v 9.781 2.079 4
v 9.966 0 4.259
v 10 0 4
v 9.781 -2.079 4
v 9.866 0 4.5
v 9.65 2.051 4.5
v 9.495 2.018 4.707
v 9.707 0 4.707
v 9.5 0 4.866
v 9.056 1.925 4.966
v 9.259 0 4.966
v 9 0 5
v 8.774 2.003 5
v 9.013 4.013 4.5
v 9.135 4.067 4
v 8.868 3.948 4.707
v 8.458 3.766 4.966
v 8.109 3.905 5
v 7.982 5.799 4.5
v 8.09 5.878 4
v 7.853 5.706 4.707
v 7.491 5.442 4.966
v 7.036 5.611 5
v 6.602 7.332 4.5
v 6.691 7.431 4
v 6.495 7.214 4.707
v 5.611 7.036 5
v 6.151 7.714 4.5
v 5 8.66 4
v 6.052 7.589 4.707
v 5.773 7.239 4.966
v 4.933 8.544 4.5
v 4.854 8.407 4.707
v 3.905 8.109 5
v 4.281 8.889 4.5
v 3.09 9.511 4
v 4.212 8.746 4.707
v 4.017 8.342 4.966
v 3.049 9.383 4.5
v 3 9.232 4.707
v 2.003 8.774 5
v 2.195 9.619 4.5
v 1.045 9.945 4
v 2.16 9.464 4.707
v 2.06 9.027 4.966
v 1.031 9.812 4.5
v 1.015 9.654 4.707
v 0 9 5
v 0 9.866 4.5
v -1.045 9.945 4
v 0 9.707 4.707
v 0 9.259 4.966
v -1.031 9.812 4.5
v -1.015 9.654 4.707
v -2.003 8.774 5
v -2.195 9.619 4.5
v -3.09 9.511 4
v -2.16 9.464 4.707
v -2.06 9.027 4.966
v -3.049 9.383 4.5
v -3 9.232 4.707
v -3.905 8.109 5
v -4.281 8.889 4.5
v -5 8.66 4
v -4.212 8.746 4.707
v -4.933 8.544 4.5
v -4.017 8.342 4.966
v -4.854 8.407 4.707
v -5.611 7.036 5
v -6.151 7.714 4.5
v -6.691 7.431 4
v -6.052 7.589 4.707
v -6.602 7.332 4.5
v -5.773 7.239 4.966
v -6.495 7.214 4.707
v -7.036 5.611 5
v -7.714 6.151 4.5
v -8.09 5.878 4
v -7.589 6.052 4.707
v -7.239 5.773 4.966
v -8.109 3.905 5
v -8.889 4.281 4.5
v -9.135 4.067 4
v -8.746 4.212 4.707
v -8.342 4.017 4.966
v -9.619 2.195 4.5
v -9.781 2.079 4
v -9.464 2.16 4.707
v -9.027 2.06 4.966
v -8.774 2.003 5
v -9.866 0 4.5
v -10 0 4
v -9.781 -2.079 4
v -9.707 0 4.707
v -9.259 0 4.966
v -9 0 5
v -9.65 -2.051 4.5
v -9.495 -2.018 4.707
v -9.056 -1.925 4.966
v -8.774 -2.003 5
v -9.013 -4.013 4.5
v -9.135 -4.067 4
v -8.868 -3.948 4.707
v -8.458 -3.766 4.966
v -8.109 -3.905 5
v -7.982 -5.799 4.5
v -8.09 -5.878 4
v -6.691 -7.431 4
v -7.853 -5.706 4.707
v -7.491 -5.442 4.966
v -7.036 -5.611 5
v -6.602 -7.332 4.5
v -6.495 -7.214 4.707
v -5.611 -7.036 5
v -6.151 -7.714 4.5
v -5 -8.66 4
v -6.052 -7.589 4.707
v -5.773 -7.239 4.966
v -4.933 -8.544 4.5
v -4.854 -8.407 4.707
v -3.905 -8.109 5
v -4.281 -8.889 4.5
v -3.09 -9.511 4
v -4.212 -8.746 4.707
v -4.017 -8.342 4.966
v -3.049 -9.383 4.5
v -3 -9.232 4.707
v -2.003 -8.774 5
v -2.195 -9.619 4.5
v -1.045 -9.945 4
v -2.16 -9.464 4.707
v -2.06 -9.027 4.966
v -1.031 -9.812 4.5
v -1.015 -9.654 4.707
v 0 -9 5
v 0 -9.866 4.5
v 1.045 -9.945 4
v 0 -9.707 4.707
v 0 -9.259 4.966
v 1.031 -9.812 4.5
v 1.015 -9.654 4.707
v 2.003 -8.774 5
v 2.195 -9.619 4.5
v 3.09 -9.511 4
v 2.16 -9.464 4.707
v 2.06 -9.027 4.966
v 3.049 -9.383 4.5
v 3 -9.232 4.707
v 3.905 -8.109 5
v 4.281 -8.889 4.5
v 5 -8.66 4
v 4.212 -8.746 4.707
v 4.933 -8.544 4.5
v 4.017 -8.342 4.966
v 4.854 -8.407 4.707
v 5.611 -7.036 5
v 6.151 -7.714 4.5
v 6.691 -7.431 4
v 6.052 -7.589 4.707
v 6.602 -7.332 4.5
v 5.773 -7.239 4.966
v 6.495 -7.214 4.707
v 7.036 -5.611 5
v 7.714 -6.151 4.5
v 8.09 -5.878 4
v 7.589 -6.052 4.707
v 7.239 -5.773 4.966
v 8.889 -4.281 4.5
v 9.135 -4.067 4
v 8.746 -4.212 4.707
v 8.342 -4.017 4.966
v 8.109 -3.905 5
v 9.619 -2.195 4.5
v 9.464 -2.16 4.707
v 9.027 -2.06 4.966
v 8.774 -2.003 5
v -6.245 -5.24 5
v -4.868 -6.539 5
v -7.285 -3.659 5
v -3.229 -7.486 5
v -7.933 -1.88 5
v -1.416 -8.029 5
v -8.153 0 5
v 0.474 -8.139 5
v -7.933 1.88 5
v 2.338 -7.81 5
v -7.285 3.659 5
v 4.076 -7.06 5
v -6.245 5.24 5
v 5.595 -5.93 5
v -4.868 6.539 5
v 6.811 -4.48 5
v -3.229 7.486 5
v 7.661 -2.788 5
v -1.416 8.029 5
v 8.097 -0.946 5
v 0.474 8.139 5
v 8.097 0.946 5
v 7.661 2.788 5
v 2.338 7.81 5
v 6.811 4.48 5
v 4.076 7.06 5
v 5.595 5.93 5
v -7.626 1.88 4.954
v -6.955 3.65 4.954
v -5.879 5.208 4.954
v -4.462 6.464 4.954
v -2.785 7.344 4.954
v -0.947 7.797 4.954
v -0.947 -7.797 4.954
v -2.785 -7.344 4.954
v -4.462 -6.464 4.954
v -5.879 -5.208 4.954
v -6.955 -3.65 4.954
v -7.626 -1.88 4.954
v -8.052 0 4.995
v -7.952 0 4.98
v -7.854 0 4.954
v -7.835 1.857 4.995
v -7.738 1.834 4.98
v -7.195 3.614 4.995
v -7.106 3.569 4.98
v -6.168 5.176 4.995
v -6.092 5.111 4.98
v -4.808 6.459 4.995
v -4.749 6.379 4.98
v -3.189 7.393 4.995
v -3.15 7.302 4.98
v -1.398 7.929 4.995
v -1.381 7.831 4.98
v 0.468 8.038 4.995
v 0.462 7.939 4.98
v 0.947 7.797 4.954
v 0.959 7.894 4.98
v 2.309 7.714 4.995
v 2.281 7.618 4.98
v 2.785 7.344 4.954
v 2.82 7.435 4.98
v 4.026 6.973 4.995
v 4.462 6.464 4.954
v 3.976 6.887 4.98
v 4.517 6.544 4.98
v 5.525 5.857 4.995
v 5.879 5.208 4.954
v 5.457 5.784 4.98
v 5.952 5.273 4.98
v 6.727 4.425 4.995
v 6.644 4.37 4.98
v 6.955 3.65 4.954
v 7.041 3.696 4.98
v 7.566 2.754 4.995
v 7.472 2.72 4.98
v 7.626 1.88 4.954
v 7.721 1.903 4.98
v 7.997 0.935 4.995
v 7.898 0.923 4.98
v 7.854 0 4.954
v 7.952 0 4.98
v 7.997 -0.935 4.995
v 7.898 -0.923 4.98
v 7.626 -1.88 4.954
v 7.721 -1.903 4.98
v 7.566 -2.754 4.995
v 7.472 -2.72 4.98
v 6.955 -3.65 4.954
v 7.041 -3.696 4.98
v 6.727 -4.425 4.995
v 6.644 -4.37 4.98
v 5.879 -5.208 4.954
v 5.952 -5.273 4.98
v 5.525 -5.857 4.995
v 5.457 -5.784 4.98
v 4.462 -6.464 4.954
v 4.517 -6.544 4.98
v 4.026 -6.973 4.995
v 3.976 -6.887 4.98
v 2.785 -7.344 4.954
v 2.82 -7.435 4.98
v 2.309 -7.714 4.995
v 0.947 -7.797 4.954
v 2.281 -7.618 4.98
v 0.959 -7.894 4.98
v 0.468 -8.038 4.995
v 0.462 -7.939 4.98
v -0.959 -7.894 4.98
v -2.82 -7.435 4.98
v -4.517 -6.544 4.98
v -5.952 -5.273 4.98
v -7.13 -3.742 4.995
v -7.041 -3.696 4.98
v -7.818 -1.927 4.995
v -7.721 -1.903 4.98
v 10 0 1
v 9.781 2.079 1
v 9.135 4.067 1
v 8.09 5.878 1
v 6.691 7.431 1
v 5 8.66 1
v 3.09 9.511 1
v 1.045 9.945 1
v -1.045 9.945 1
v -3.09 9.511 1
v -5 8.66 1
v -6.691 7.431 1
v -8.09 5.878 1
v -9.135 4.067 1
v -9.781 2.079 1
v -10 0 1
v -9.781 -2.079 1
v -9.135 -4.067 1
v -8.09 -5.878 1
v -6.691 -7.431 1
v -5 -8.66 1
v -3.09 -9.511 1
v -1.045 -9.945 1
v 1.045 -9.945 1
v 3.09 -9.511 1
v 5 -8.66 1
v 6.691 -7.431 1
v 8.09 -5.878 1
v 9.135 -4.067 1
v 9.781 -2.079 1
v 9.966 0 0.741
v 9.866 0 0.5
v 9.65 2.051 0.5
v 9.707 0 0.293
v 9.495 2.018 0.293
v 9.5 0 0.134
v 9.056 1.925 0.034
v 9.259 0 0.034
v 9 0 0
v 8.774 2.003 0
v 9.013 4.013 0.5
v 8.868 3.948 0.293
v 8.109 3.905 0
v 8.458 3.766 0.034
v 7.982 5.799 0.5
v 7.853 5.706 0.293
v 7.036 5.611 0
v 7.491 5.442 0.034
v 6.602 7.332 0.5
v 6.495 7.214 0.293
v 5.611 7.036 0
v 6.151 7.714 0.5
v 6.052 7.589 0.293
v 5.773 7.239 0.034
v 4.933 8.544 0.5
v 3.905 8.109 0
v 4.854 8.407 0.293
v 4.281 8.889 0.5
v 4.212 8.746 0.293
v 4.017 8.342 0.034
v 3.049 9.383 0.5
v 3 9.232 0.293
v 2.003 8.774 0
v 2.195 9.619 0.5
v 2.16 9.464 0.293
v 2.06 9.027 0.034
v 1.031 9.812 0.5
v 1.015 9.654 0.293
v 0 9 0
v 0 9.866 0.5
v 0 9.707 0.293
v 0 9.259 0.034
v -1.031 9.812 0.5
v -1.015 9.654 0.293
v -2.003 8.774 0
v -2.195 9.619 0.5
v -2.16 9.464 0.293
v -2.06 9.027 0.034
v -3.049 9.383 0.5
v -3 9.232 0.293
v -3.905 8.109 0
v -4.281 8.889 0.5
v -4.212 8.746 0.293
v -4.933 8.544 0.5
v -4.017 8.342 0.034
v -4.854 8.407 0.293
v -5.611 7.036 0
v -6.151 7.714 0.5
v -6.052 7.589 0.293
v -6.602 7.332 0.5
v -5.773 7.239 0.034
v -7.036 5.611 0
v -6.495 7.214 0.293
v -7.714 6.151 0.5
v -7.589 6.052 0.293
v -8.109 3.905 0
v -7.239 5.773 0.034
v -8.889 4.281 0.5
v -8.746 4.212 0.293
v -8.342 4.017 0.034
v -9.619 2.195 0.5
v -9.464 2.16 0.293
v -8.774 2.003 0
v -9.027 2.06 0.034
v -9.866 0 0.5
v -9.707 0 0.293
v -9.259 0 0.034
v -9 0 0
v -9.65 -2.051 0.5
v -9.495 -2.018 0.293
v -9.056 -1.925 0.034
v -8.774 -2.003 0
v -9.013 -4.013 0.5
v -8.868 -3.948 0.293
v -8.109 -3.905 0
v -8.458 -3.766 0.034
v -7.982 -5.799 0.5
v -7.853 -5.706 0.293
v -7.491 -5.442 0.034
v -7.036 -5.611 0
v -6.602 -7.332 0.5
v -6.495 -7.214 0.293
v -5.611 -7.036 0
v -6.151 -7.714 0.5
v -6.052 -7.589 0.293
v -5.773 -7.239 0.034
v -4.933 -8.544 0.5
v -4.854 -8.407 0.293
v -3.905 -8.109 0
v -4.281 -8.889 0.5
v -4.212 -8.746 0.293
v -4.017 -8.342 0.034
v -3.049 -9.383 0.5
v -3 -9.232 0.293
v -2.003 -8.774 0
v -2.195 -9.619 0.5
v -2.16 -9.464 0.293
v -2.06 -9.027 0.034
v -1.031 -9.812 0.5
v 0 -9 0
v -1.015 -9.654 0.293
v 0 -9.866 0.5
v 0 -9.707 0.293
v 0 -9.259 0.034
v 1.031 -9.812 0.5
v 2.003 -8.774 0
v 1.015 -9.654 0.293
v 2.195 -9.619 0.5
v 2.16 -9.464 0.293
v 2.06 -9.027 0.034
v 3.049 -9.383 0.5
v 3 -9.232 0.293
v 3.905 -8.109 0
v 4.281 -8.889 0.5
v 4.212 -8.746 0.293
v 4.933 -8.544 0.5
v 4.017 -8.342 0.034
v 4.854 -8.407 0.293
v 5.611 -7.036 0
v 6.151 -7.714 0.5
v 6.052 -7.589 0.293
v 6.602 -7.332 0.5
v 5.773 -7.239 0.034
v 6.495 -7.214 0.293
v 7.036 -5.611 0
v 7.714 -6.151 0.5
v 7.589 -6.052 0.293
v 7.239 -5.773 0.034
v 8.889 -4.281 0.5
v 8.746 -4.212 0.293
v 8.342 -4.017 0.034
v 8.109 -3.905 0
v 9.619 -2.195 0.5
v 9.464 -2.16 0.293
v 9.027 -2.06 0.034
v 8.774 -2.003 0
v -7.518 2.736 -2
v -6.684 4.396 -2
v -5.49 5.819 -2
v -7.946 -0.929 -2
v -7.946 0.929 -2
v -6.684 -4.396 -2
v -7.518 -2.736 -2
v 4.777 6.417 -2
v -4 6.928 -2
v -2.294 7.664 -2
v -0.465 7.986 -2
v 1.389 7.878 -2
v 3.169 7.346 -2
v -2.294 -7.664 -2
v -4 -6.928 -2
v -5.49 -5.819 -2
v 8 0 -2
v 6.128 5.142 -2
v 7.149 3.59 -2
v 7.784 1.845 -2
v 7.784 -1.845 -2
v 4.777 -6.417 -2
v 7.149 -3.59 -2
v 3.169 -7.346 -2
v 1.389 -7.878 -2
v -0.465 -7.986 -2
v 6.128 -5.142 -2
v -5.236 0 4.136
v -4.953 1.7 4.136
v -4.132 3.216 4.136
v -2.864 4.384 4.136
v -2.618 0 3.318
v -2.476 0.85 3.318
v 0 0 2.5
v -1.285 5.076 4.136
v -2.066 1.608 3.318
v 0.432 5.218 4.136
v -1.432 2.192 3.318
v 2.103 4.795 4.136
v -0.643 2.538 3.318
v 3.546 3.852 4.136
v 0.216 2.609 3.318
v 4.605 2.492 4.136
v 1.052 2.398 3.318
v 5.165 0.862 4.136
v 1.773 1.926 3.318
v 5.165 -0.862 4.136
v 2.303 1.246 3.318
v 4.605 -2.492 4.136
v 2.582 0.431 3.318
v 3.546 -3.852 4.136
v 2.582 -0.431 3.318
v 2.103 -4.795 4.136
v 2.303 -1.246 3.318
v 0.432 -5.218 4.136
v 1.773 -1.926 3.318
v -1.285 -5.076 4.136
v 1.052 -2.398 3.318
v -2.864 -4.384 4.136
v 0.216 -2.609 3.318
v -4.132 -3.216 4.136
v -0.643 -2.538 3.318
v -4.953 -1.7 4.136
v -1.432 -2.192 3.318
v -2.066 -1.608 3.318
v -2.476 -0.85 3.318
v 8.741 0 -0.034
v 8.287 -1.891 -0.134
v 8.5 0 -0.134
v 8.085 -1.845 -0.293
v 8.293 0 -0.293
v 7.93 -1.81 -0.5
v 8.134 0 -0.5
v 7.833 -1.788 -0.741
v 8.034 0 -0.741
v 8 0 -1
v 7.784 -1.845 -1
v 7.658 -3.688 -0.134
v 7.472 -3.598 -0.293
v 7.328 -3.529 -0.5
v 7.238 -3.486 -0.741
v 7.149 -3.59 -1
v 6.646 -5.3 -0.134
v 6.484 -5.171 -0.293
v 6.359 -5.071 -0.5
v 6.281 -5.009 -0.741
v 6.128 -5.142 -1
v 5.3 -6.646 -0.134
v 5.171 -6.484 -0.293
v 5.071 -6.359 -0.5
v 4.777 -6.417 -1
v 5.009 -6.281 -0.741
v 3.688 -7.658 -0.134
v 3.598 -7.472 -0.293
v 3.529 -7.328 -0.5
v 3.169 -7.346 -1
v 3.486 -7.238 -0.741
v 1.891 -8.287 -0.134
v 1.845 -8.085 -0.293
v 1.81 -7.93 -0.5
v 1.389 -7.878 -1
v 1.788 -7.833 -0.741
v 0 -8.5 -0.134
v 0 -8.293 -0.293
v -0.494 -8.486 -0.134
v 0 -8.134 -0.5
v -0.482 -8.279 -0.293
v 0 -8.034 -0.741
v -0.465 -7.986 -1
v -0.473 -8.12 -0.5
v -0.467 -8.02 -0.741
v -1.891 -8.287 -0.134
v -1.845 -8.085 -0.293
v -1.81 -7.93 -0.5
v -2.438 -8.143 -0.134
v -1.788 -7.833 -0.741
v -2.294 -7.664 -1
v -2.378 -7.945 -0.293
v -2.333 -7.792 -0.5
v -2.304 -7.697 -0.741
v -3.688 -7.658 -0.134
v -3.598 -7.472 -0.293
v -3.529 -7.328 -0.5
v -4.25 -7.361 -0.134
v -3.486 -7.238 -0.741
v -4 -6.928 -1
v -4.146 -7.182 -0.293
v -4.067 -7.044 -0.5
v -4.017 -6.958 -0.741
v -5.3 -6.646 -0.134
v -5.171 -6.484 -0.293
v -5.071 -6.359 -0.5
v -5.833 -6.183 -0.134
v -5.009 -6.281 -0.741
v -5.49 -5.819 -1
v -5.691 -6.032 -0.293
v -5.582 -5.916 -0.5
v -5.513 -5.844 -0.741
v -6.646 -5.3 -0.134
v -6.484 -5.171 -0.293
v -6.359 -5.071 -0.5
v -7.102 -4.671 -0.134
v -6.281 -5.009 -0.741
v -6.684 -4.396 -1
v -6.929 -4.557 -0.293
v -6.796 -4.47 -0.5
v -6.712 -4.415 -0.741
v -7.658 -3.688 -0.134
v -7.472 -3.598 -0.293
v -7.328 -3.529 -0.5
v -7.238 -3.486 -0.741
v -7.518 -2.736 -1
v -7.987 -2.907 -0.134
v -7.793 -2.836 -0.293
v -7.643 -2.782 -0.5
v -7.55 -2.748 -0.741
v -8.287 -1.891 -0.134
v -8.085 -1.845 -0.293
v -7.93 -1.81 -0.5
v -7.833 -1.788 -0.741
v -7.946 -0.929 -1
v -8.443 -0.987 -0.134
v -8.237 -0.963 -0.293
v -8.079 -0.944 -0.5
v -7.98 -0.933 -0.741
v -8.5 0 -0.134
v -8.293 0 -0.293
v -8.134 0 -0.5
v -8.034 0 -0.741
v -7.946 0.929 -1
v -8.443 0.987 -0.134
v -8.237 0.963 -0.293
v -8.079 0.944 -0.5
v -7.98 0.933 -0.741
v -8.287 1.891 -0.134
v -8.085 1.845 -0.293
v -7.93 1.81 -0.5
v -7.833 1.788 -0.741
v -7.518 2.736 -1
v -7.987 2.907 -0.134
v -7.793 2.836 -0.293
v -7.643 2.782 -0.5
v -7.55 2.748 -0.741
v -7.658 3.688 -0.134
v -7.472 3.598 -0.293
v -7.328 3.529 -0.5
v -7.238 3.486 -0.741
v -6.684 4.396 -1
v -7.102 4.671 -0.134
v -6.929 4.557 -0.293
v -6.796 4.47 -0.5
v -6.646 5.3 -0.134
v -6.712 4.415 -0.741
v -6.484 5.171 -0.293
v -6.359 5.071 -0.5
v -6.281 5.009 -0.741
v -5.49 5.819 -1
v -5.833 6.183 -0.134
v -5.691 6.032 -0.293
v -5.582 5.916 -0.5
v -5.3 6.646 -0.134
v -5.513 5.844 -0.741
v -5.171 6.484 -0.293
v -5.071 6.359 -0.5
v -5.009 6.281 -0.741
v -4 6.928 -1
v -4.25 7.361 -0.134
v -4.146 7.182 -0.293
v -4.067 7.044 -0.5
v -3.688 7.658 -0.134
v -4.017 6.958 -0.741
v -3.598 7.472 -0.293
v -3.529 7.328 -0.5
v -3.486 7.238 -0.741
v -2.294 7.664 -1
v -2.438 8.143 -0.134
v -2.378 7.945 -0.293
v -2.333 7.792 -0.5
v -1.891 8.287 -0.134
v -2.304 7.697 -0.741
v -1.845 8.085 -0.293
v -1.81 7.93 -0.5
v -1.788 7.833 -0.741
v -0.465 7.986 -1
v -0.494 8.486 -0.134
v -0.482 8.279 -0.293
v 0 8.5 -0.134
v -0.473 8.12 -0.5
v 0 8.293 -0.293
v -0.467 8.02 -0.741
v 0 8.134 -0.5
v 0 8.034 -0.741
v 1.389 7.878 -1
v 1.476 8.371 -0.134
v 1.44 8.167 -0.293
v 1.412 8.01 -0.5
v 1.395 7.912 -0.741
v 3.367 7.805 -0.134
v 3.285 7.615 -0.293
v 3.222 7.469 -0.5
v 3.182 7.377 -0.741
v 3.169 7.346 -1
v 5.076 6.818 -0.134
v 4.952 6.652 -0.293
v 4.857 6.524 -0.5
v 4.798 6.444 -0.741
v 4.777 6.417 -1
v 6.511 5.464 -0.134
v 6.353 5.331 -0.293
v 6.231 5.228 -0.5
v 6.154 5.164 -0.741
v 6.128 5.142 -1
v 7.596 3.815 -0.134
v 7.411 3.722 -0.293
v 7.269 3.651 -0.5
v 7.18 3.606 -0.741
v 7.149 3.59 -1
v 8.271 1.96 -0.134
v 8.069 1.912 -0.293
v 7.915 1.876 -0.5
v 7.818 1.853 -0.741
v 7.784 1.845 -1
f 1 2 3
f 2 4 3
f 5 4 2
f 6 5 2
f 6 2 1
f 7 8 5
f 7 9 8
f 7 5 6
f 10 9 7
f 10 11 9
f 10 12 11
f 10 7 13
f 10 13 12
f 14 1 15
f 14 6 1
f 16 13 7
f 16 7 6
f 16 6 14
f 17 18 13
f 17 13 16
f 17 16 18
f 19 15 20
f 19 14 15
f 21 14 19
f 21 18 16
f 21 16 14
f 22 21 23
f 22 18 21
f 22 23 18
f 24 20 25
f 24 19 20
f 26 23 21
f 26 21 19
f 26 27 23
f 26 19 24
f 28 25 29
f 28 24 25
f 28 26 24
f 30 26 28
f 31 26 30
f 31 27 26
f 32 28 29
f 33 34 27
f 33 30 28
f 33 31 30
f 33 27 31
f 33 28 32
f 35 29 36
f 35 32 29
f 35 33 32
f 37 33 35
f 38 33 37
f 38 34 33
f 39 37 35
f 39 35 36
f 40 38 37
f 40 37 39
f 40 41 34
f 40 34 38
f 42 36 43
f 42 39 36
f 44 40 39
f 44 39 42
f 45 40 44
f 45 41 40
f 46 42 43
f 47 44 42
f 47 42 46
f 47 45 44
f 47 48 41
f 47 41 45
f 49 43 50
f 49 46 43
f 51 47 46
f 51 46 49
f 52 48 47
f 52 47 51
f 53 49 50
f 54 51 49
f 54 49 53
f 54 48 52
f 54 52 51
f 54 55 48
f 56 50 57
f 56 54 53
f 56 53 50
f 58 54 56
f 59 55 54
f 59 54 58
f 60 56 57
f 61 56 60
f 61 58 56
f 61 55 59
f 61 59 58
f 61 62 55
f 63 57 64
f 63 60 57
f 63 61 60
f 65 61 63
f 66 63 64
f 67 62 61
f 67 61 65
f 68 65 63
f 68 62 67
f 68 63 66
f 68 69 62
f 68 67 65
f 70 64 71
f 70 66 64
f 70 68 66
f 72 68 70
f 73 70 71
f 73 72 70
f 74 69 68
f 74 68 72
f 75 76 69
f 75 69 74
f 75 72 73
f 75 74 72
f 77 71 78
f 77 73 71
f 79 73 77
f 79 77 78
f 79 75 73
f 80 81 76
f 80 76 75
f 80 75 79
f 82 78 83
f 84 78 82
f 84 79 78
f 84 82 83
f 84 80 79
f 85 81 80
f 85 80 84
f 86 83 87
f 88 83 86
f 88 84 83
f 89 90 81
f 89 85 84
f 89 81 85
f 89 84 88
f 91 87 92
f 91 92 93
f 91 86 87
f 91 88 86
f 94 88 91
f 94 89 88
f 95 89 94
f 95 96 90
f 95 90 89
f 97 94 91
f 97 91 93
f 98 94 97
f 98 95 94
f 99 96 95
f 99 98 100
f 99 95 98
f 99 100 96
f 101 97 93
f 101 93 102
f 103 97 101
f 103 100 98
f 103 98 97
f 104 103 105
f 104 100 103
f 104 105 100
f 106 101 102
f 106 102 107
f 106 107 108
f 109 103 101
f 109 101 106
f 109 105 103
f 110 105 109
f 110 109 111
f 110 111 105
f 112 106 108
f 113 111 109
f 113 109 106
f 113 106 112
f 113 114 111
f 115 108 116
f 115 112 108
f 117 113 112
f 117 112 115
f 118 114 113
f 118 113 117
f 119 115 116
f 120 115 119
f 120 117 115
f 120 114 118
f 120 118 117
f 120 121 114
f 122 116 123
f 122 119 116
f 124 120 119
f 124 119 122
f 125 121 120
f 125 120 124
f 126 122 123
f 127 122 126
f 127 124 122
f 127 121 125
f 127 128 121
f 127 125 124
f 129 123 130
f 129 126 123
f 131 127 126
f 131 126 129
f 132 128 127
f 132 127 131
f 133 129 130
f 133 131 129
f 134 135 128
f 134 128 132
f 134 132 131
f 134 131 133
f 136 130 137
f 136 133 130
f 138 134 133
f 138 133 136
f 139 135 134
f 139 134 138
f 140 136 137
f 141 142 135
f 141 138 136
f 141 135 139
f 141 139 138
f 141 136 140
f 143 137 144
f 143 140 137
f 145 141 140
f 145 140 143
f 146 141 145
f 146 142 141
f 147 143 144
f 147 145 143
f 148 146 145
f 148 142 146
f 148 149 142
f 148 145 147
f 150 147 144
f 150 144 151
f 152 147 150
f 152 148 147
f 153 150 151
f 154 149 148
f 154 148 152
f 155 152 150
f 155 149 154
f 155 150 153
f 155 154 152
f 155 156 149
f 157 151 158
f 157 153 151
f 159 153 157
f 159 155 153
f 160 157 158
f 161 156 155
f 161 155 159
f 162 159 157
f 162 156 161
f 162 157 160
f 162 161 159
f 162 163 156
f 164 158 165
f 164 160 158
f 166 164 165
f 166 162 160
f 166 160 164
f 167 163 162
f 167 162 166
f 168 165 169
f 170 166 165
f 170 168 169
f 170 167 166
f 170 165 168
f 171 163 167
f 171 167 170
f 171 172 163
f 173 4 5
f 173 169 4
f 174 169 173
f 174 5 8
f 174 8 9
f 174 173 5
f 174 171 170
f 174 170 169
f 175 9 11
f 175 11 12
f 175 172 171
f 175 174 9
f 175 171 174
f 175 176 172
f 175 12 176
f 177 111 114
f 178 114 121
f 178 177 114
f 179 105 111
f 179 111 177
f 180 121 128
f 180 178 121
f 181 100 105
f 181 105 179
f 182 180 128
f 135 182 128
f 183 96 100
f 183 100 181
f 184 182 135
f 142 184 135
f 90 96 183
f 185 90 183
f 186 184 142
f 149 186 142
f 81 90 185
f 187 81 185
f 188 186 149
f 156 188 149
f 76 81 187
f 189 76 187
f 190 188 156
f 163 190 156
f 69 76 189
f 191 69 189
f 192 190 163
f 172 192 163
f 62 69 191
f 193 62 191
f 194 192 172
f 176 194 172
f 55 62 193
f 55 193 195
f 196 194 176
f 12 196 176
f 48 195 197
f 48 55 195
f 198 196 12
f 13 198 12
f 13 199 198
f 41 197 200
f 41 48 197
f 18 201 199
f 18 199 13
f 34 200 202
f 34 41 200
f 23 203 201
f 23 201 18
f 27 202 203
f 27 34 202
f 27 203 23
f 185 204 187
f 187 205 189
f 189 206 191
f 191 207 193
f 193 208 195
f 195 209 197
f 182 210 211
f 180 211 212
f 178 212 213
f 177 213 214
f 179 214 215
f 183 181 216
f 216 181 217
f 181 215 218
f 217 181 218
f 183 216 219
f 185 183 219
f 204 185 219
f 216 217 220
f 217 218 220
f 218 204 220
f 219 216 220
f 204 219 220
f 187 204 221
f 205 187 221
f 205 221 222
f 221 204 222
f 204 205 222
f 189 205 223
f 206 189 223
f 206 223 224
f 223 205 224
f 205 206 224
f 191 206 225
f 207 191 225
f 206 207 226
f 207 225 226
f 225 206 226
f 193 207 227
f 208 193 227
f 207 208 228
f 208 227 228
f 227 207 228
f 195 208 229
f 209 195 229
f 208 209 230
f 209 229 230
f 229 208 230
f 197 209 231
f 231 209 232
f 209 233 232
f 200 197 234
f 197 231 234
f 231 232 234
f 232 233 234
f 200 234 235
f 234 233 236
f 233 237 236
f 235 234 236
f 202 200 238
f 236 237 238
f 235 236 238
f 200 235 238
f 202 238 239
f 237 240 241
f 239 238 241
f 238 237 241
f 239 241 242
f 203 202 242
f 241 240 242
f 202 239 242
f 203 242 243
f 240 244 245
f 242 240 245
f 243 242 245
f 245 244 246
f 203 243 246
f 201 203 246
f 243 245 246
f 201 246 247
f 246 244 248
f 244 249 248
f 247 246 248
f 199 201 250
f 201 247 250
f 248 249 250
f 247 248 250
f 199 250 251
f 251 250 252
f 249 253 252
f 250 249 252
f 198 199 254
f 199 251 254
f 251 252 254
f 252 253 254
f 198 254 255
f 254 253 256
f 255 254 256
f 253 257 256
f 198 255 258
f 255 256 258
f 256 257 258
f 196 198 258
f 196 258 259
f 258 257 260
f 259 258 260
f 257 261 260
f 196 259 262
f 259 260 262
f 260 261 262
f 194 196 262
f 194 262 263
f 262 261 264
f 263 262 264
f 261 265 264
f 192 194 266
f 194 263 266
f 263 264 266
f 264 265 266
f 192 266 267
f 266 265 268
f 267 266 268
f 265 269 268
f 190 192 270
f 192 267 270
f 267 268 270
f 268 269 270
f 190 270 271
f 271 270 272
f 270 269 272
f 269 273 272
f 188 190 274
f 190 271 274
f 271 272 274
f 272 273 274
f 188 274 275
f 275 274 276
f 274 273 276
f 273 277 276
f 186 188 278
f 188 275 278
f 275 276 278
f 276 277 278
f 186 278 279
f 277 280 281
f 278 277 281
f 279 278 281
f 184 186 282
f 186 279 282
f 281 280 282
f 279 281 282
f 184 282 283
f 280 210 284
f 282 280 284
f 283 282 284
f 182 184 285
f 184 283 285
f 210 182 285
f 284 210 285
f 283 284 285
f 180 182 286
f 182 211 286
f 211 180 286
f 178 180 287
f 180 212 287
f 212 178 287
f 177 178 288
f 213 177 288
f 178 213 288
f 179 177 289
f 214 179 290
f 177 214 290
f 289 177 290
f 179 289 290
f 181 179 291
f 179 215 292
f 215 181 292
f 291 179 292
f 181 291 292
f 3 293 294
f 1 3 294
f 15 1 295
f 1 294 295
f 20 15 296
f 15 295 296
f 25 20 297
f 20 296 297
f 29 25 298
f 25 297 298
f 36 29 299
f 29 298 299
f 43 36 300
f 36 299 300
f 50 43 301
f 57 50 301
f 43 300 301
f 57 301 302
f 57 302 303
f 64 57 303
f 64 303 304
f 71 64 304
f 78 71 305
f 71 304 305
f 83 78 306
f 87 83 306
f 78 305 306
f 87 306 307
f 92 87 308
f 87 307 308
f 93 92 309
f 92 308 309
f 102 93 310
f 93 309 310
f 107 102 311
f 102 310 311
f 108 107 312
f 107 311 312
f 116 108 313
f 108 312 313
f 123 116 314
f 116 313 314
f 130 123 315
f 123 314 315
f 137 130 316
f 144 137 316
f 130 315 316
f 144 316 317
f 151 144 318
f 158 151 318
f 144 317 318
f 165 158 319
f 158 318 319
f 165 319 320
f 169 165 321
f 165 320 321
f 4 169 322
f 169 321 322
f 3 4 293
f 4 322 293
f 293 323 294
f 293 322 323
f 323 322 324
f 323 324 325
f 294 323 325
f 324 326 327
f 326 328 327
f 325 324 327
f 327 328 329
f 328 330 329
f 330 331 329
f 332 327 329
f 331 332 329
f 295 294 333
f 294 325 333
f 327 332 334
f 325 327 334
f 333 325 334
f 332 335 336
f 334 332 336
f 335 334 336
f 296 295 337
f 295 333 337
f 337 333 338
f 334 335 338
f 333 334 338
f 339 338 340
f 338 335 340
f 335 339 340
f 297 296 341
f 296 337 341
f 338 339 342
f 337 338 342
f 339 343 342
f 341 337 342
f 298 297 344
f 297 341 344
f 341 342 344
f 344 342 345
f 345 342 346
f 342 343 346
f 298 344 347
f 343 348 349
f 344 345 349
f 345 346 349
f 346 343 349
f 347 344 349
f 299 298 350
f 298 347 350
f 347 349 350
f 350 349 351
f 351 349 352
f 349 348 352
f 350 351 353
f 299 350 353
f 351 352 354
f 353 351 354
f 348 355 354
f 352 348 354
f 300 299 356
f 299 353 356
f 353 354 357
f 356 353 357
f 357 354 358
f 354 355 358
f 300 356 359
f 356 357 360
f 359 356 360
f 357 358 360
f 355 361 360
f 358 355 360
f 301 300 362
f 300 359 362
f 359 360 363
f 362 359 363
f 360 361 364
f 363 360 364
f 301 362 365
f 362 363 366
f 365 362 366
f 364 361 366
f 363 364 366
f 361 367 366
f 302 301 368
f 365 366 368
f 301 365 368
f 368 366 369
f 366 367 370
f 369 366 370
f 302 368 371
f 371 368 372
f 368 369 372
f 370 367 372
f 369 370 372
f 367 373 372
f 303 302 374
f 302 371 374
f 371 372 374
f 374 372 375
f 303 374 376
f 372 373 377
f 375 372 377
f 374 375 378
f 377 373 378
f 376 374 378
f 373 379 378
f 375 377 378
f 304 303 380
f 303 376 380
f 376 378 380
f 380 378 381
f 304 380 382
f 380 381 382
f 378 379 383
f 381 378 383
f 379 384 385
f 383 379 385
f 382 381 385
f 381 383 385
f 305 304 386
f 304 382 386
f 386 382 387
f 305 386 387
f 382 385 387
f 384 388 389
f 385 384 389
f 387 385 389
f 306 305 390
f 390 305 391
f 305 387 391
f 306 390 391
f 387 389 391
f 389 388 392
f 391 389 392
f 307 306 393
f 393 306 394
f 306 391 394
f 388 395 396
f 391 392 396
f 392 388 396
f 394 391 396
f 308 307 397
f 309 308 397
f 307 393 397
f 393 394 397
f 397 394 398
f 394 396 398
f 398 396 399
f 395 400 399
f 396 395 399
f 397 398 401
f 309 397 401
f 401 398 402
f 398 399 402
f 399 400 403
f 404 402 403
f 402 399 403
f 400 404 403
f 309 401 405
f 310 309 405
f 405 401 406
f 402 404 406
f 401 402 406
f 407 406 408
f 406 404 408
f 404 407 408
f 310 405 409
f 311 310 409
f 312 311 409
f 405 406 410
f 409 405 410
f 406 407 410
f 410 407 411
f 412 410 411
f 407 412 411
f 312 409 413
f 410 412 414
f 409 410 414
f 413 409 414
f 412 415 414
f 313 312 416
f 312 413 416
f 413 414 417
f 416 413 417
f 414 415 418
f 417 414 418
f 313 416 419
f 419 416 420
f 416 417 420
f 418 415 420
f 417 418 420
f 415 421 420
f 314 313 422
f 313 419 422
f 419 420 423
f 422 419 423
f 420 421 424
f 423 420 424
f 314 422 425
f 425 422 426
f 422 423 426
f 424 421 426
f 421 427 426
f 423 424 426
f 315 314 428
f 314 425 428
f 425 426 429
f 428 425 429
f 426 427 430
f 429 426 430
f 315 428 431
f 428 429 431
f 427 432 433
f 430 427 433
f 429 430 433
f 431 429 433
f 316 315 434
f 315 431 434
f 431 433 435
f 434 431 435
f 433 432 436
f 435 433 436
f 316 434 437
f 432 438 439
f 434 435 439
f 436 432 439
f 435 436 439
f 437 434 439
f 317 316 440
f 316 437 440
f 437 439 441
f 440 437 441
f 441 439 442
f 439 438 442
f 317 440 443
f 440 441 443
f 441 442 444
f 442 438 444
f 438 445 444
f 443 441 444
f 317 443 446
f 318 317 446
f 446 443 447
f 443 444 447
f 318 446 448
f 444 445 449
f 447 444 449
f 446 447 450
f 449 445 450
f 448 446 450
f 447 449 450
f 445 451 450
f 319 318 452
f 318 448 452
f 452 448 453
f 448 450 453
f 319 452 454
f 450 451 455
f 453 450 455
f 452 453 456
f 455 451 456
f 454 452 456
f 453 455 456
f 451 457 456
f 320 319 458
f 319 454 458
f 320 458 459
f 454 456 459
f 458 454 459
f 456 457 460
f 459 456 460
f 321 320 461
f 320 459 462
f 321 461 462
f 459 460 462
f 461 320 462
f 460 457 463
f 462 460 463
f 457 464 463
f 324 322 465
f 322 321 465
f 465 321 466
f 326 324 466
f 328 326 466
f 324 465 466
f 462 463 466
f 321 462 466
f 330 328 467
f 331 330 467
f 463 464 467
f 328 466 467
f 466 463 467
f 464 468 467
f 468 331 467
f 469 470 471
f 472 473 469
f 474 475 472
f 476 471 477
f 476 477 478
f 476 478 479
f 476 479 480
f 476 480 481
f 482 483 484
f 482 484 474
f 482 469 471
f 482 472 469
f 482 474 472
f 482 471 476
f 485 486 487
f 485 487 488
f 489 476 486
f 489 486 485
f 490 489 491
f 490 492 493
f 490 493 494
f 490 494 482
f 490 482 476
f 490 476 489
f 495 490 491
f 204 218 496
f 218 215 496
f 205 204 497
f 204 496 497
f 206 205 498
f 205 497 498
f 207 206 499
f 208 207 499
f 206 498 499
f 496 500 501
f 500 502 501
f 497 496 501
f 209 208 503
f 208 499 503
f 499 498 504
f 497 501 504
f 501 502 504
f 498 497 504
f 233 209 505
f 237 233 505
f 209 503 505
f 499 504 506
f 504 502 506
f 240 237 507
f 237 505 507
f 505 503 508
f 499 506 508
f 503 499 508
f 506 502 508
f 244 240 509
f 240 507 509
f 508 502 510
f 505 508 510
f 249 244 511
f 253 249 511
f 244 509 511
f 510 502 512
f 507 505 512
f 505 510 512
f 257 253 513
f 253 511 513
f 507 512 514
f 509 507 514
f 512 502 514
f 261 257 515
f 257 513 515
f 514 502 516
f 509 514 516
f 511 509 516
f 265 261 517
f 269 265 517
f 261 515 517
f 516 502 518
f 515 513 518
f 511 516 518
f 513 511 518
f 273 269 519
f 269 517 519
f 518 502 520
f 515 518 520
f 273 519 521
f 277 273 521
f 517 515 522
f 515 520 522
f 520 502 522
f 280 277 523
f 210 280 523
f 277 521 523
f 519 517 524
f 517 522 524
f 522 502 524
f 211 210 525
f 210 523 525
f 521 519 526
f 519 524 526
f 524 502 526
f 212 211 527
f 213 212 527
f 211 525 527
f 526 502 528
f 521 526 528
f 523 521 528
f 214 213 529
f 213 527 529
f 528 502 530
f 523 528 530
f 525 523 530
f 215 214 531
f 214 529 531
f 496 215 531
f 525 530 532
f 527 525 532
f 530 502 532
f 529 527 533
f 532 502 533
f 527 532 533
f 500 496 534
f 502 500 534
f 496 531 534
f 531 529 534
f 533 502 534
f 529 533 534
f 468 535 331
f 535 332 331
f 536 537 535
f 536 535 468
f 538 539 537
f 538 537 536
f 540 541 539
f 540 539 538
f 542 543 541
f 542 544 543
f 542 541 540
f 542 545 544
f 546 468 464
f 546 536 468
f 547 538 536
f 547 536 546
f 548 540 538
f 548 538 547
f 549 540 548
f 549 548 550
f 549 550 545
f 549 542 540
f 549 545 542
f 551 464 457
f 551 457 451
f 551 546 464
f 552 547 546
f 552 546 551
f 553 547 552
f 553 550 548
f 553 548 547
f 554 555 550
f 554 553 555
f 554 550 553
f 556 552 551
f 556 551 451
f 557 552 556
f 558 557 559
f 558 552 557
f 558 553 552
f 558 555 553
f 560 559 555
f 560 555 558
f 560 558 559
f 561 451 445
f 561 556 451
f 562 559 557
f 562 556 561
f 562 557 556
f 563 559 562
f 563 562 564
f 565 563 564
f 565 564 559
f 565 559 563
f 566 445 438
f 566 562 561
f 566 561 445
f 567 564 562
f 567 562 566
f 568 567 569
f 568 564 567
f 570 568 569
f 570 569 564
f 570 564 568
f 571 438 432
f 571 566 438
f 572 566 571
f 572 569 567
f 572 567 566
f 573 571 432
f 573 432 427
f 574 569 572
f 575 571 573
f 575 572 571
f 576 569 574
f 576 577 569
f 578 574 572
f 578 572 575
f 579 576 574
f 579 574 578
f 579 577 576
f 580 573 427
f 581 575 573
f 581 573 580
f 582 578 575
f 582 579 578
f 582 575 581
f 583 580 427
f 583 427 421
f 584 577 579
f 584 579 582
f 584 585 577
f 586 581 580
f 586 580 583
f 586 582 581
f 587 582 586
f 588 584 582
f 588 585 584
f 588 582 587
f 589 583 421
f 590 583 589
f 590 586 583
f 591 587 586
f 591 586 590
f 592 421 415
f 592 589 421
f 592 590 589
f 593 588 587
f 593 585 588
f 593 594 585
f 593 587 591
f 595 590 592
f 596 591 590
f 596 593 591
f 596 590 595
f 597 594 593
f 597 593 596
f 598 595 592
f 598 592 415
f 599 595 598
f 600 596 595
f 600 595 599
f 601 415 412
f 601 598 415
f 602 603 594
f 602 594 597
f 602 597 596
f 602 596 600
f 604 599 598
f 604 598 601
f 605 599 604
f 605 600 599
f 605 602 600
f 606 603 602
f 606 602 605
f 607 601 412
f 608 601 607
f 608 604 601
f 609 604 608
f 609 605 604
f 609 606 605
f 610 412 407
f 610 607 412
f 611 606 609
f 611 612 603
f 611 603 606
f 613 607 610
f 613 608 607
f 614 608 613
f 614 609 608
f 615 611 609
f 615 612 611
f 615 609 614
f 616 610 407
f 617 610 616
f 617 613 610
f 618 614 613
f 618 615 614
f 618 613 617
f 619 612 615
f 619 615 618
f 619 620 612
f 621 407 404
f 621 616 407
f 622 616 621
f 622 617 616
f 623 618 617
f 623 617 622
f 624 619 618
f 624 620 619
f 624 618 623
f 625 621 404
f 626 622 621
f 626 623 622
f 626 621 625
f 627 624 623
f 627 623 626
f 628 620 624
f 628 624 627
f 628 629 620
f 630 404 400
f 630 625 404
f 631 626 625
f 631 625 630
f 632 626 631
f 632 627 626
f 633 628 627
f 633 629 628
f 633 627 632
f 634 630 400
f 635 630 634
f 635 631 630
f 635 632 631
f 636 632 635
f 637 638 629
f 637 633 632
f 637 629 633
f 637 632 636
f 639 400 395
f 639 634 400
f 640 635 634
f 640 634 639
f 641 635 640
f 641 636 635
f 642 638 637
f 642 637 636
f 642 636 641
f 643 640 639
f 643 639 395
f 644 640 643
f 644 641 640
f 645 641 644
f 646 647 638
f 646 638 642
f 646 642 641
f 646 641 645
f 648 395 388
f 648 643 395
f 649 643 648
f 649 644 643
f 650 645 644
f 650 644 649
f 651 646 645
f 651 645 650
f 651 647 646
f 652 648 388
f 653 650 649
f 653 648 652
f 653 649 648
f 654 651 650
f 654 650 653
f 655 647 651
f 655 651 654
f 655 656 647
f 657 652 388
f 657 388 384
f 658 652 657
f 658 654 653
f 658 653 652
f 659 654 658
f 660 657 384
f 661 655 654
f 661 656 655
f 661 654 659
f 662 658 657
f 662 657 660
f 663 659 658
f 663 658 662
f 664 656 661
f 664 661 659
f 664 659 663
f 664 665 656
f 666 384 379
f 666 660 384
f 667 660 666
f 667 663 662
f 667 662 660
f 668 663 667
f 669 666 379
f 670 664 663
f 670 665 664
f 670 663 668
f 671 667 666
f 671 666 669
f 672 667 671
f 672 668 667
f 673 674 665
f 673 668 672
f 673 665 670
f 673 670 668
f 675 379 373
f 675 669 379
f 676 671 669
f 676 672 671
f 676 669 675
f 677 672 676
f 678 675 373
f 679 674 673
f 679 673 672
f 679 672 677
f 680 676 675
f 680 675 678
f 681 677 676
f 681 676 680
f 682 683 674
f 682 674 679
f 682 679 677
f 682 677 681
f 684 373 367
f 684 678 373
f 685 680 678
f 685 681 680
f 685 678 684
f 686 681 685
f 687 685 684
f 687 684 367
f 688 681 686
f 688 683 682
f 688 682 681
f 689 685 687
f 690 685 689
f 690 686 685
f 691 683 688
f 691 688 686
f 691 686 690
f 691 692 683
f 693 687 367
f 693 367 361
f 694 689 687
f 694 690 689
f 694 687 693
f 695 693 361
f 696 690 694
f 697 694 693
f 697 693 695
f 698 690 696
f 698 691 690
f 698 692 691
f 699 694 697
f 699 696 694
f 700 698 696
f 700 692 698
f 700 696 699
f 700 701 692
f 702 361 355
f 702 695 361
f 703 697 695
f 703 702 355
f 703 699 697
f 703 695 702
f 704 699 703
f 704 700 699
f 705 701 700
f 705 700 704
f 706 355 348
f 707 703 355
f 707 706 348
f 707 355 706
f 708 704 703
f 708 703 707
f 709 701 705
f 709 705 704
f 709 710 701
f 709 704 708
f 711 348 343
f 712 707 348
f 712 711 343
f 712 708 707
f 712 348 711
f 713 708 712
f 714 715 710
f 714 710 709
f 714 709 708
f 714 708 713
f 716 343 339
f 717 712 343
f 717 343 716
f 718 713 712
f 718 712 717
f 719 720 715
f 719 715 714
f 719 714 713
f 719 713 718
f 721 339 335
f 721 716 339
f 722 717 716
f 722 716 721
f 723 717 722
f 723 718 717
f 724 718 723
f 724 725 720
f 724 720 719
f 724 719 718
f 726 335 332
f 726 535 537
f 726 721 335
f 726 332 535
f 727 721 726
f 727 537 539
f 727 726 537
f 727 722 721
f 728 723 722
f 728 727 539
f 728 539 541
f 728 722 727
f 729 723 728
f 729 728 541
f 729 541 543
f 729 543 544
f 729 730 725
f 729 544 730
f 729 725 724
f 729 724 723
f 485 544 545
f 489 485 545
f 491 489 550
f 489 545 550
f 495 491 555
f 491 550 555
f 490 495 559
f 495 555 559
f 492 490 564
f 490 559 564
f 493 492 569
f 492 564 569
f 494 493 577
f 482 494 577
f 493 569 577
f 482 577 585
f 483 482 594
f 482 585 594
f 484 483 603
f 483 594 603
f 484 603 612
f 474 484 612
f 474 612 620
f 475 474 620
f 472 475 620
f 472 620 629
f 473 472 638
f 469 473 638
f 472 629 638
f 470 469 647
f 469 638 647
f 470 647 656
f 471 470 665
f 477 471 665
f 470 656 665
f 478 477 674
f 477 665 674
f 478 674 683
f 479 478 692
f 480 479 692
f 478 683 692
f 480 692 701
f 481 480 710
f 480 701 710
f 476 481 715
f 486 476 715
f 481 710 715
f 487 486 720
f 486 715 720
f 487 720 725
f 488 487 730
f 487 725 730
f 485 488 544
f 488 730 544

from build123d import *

# Parameters (mm, degrees)
F0_R     = 10
F1_DEPTH = 5
F4_R     = 8
F5_DEPTH = 2
F6_R     = 0.99999


# Not quite as in the source:
# - a fillet or chamfer is up to 0.001 mm smaller than in the source, because OpenCascade refuses the exact size


with BuildPart() as f1:
    # F0 (on Top) → F1 (new body)
    with BuildSketch(Plane.XY):
        Circle(F0_R)
    extrude(amount=F1_DEPTH)

    # F2 (on Front) → F3 (revolve, cut)
    with BuildSketch(Plane.XZ):
        Polygon((-8, 5), (0, 2.5), (0, 5), align=None)
    revolve(axis=Axis((0, 0, 3.75), (0, 0, -1)), mode=Mode.SUBTRACT)

    # F4 (on face) → F5 (join)
    with BuildSketch(Plane(origin=(0, 0, 0), x_dir=(1, 0, 0), z_dir=(0, 0, -1))):
        Circle(F4_R)
    extrude(amount=F5_DEPTH)

    # F6 (radius 1 in the source; OpenCascade refuses exactly that, so slightly less here)
    f6_edges = [f1.edges().sort_by_distance(p)[0] for p in [
        (-8, 0, 0),
        (-10, 0, 0),
        (-10, 0, 5),
        (8, 0, 5),
    ]]
    fillet(f6_edges, radius=F6_R)


solid = f1.part
